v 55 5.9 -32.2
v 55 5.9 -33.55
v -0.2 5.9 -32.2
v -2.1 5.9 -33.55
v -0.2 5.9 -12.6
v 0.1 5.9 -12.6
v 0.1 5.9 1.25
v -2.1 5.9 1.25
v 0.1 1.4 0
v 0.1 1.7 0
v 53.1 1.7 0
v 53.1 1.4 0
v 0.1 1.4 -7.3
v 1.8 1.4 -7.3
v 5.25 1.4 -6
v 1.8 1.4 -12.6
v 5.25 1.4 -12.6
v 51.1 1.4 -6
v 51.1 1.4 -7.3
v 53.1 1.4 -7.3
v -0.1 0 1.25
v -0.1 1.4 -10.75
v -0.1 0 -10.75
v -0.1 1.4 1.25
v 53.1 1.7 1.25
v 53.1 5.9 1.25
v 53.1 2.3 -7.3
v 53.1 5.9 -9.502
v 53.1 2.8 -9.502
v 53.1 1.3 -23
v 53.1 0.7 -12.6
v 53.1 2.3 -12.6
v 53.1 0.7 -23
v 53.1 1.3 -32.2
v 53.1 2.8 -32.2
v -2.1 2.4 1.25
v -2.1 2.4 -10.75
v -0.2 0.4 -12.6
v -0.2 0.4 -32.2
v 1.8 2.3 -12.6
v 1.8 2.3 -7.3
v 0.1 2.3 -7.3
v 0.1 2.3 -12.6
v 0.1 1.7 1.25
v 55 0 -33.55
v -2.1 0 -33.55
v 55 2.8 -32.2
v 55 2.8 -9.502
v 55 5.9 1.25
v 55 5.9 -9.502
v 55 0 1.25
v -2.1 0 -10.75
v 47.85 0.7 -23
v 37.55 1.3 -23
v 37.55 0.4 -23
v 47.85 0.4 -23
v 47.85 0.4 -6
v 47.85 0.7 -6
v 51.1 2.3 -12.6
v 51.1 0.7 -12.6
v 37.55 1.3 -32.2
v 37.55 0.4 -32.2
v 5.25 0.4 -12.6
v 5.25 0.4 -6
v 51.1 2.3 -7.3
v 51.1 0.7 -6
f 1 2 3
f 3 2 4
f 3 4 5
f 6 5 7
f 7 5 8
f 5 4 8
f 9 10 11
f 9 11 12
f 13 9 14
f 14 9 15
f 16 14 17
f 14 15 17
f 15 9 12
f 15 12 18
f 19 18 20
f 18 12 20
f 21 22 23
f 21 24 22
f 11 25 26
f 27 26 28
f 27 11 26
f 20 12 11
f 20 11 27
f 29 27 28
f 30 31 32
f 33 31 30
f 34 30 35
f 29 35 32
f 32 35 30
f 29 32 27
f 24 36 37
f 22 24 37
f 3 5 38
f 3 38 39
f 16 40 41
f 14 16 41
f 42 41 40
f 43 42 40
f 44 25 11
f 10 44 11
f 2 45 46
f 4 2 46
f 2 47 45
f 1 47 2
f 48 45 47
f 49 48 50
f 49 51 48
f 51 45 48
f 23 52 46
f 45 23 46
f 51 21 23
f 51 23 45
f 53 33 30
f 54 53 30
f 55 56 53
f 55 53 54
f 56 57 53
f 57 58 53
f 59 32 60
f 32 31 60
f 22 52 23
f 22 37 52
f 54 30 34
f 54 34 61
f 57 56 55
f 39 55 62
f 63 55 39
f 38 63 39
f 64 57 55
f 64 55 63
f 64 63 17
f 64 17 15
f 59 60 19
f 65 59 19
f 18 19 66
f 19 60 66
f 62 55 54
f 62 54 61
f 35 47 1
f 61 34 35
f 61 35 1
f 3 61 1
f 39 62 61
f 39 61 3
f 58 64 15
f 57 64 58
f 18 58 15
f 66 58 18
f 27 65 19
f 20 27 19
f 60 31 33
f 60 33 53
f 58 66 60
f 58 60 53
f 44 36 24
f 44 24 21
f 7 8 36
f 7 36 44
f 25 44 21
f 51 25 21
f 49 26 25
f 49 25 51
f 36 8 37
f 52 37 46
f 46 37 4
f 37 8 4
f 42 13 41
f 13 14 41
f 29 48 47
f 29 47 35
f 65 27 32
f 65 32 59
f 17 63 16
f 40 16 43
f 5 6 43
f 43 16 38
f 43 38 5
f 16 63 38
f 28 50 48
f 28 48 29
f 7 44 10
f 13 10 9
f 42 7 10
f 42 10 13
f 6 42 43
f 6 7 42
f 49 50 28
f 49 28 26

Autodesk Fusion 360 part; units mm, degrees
sketch "Sketch1" plane through (0, 0, 0) normal (0, 1, 0) x (1, 0, 0)
  line L0 (0, 0) -> (53.1, 0)
  line L1 (53.1, 0) -> (53.1, 32)
  line L2 (53.1, 32) -> (0, 32)
  line L3 (0, 32) -> (0, 0)
  line L4 (26.55, 0) -> (26.55, -1.25)
  line L5 (26.55, -1.25) -> (26.55, 33.35)
  line L6 (26.55, 33.35) -> (55, 33.35)
  line L7 (55, 33.35) -> (-1.9, 33.35)
  line L8 (-1.9, 33.35) -> (-1.9, -1.25)
  line L9 (-1.9, -1.25) -> (55, -1.25)
  line L10 (55, -1.25) -> (55, 33.35)
  dimension "d1" = 53.1
  dimension "d2" = 32
  dimension "d3" = 1.25
  dimension "d4" = 34.6
  dimension "d5" = 28.45
  dimension "d6" = 56.9
  dimension "d7" = 34.6
extrude "Extrude1" add sketch "Sketch1" along normal blind 1.5
sketch "Sketch2" plane through (0, 1.5, 0) normal (0, 1, 0) x (-1, 0, 0)
  line L0 (-55, 1.25) -> (-55, -33.35)
  line L1 (-55, -33.35) -> (1.9, -33.35)
  line L2 (1.9, -33.35) -> (1.9, 1.25)
  line L3 (1.9, 1.25) -> (-55, 1.25)
  line L4 (1.9, -33.35) -> (-55, -33.35)
  line L5 (-55, -33.35) -> (-55, -32)
  line L6 (-55, -32) -> (1.9, -32)
  line L7 (1.9, -32) -> (1.9, -33.35)
  line L8 (1.9, -32) -> (0, -32)
  line L9 (0, -32) -> (0, 1.25)
  line L10 (0, 1.25) -> (1.9, 1.25)
  line L11 (1.9, 1.25) -> (1.9, -32)
  line L12 (-55, -32) -> (-53.1, -32)
  line L13 (-53.1, -32) -> (-53.1, 1.25)
  line L14 (-53.1, 1.25) -> (-55, 1.25)
  line L15 (-55, 1.25) -> (-55, -32)
  dimension "d10" = 1.35
  dimension "d11" = 1.9
  dimension "d12" = 1.9
extrude "Extrude2" add sketch "Sketch2" along normal blind 4.4 contours L0 L3 L6 L12 L13 L14 L15 | L0 L1 L2 L4 L5 L6 L7 L8 L12 | L2 L3 L6 L8 L9 L10 L11
sketch "Sketch3" plane through (0, 1.5, 0) normal (0, 1, 0) x (-1, 0, 0)
  line L0 (0, -32) -> (0, 1.25)
  line L1 (0, 1.25) -> (-53.1, 1.25)
  line L2 (-53.1, 1.25) -> (-53.1, -32)
  line L3 (-53.1, -32) -> (0, -32)
  line L4 (0, 1.25) -> (-53.1, 1.25)
  line L5 (-53.1, 1.25) -> (-53.1, 0)
  line L6 (-53.1, 0) -> (0, 0)
  line L7 (0, 0) -> (0, 1.25)
  dimension "d15" = 1.25
extrude "Extrude3" add sketch "Sketch3" along normal blind 0.5 contours L0 L1 L2 L4 L5 L6 L7
extrude "Extrude4" add 1 faces at (17.7, 1.5, -21.3333) along direction (0, 1, 0) blind 0.2
sketch "Sketch4" plane through (0, 1.7, 0) normal (0, 1, 0) x (-1, 0, 0)
  line L0 (0, 0) -> (-53.1, 0)
  line L1 (-53.1, 0) -> (-53.1, -32)
  line L2 (-53.1, -32) -> (0, -32)
  line L3 (0, -32) -> (0, 0)
  line L4 (-26.55, 0) -> (-26.55, -6)
  line L5 (-26.55, -32) -> (-26.55, -23)
  line L6 (-53.1, -16) -> (-47.85, -16)
  line L7 (0, -16) -> (-5.25, -16)
  line L8 (-26.55, -6) -> (-5.25, -6)
  line L9 (-26.55, -23) -> (-47.85, -23)
  line L10 (-47.85, -23) -> (-5.25, -23)
  line L11 (-5.25, -23) -> (-5.25, -6)
  line L12 (-5.25, -6) -> (-47.85, -6)
  line L13 (-47.85, -6) -> (-47.85, -23)
  dimension "d20" = 6
  dimension "d21" = 9
  dimension "d22" = 5.25
  dimension "d23" = 5.25
extrude "Extrude5" cut sketch "Sketch4" against normal blind 1.3 contours L8 L9 L10 L11 L12 L13
sketch "Sketch5" plane through (0, 1.7, 0) normal (0, 1, 0) x (-1, 0, 0)
  line L0 (-5.25, -23) -> (-47.85, -23)
  line L1 (-47.85, -23) -> (-47.85, -6)
  line L2 (-47.85, -6) -> (-5.25, -6)
  line L3 (-5.25, -6) -> (-5.25, -23)
  line L4 (0, 0) -> (-53.1, 0)
  line L5 (-53.1, 0) -> (-53.1, -32)
  line L6 (-53.1, -32) -> (0, -32)
  line L7 (0, -32) -> (0, 0)
  line L8 (-53.1, 0) -> (-51.1, 0)
  line L9 (-51.1, 0) -> (-51.1, -12.6)
  line L10 (-51.1, -12.6) -> (-53.1, -12.6)
  line L11 (-53.1, -12.6) -> (-53.1, 0)
  line L12 (0, 0) -> (-2, 0)
  line L13 (-2, 0) -> (-2, -12.6)
  line L14 (-2, -12.6) -> (0, -12.6)
  line L15 (0, -12.6) -> (0, 0)
  dimension "d26" = 2
  dimension "d27" = 12.6
  dimension "d28" = 2
  dimension "d29" = 12.6
extrude "Extrude6" add sketch "Sketch5" along normal blind 0.6 contours L4 L7 L12 L13 L14 L15 | L4 L5 L8 L9 L10 L11
sketch "Sketch6" plane through (0, 5.9, 0) normal (0, 1, 0) x (-1, 0, 0)
  line L0 (-53.1, -32) -> (-53.1, 1.25)
  line L1 (-53.1, 1.25) -> (-55, 1.25)
  line L2 (-55, 1.25) -> (-55, -33.35)
  line L3 (-55, -33.35) -> (1.9, -33.35)
  line L4 (1.9, -33.35) -> (1.9, 1.25)
  line L5 (1.9, 1.25) -> (0, 1.25)
  line L6 (0, 1.25) -> (0, -32)
  line L7 (0, -32) -> (-53.1, -32)
  line L8 (-53.1, -32) -> (-55, -32)
  line L9 (-55, -32) -> (-55, -12.5021)
  line L10 (-55, -12.5021) -> (-53.1, -12.5021)
  line L11 (-53.1, -12.5021) -> (-53.1, -32)
extrude "Extrude7" cut sketch "Sketch6" against normal blind 3.6 contours L0 L2 L8 L9 L10 L11
sketch "Sketch7" plane through (0, 2.3, 0) normal (0, 1, 0) x (-1, 0, 0)
  line L0 (-53.1, -12.6) -> (-51.1, -12.6)
  line L1 (-51.1, -12.6) -> (-51.1, 0)
  line L2 (-51.1, 0) -> (-53.1, 0)
  line L3 (-53.1, 0) -> (-53.1, -12.5021)
  line L4 (-53.1, -12.5021) -> (-55, -12.5021)
  line L5 (-55, -12.5021) -> (-55, -32)
  line L6 (-55, -32) -> (-53.1, -32)
  line L7 (-53.1, -32) -> (-53.1, -12.6)
  line L8 (-51.1, 0) -> (-53.1, 0)
  line L9 (-53.1, 0) -> (-53.1, -6.2511)
  line L10 (-53.1, -6.2511) -> (-51.1, -6.2511)
  line L11 (-51.1, -6.2511) -> (-51.1, 0)
extrude "Extrude8" cut sketch "Sketch7" against normal blind 0.6 contours L1 L2 L3 L8 L9 L10 L11
sketch "Sketch8" plane through (0, 2.3, 0) normal (0, 1, 0) x (-1, 0, 0)
  line L0 (0, -12.6) -> (0, 0)
  line L1 (0, 0) -> (-2, 0)
  line L2 (-2, 0) -> (-2, -12.6)
  line L3 (-2, -12.6) -> (0, -12.6)
  line L4 (-2, 0) -> (0, 0)
  line L5 (0, 0) -> (0, -6.3)
  line L6 (0, -6.3) -> (-2, -6.3)
  line L7 (-2, -6.3) -> (-2, 0)
extrude "Extrude9" cut sketch "Sketch8" against normal blind 0.6 contours L0 L1 L2 L4 L5 L6 L7
sketch "Sketch9" plane through (0, 1.7, 0) normal (0, 1, 0) x (-1, 0, 0)
  line L0 (-5.25, -23) -> (-47.85, -23)
  line L1 (-47.85, -23) -> (-47.85, -6)
  line L2 (-47.85, -6) -> (-5.25, -6)
  line L3 (-5.25, -6) -> (-5.25, -23)
  line L4 (-51.1, -6.2511) -> (-51.1, -12.6)
  line L5 (-51.1, -12.6) -> (-53.1, -12.6)
  line L6 (-53.1, -12.6) -> (-53.1, -32)
  line L7 (-53.1, -32) -> (0, -32)
  line L8 (0, -32) -> (0, -12.6)
  line L9 (0, -12.6) -> (-2, -12.6)
  line L10 (-2, -12.6) -> (-2, -6.3)
  line L11 (-2, -6.3) -> (0, -6.3)
  line L12 (0, -6.3) -> (0, 0)
  line L13 (0, 0) -> (-53.1, 0)
  line L14 (-53.1, 0) -> (-53.1, -6.2511)
  line L15 (-53.1, -6.2511) -> (-51.1, -6.2511)
  line L16 (0, -12.6) -> (-53.1, -12.6)
  line L17 (-53.1, -12.6) -> (-53.1, -32)
  line L18 (-53.1, -32) -> (0, -32)
  line L19 (0, -32) -> (0, -12.6)
extrude "Extrude10" cut sketch "Sketch9" against normal blind 1 contours L0 L1 L3 L5 L6 L7 L8 L9 L16 L17 L18 L19
sketch "Sketch10" plane through (0, 1.7, 0) normal (0, 1, 0) x (-1, 0, 0)
  line L0 (-5.25, -12.6) -> (-2, -12.6)
  line L1 (-2, -12.6) -> (-2, -6.3)
  line L2 (-2, -6.3) -> (0, -6.3)
  line L3 (0, -6.3) -> (0, 0)
  line L4 (0, 0) -> (-53.1, 0)
  line L5 (-53.1, 0) -> (-53.1, -6.2511)
  line L6 (-53.1, -6.2511) -> (-51.1, -6.2511)
  line L7 (-51.1, -6.2511) -> (-51.1, -12.6)
  line L8 (-51.1, -12.6) -> (-47.85, -12.6)
  line L9 (-47.85, -12.6) -> (-47.85, -6)
  line L10 (-47.85, -6) -> (-5.25, -6)
  line L11 (-5.25, -6) -> (-5.25, -12.6)
  line L12 (-47.85, -6) -> (-51.1, -6)
  line L13 (-51.1, -6) -> (-51.1, -12.6)
  line L14 (-51.1, -12.6) -> (-47.85, -12.6)
  line L15 (-47.85, -12.6) -> (-47.85, -6)
extrude "Extrude11" cut sketch "Sketch10" against normal blind 1 contours L7 L8 L9 L12 L13 L14 L15
sketch "Sketch11" plane through (0, 0.7, 0) normal (0, 1, 0) x (-1, 0, 0)
  line L0 (0, -32) -> (0, -12.6)
  line L1 (0, -12.6) -> (-5.25, -12.6)
  line L2 (-5.25, -12.6) -> (-5.25, -23)
  line L3 (-5.25, -23) -> (-47.85, -23)
  line L4 (-47.85, -23) -> (-47.85, -6)
  line L5 (-47.85, -6) -> (-51.1, -6)
  line L6 (-51.1, -6) -> (-51.1, -12.6)
  line L7 (-51.1, -12.6) -> (-53.1, -12.6)
  line L8 (-53.1, -12.6) -> (-53.1, -32)
  line L9 (-53.1, -32) -> (0, -32)
  line L10 (-26.55, -32) -> (-53.1, -32)
  line L11 (-53.1, -32) -> (-53.1, -23)
  line L12 (-53.1, -23) -> (-26.55, -23)
  line L13 (-26.55, -23) -> (-26.55, -32)
extrude "Extrude12" add sketch "Sketch11" along normal blind 1 contours L3 L8 L9 L10 L11 L12 L13
extrude "Extrude13" cut 1 faces at (26.55, 1.0333, -26) along direction (1, 0, 0) blind 11
extrude "Extrude14" cut 1 faces at (54.3667, 4.7, -12.5021) along direction (0, 0, 1) blind 3
extrude "Extrude15" add 1 faces at (53.1, 4.7, -4.8344) along direction (-1, 0, 0) blind 0.5
sketch "Sketch12" plane through (0, 0, 0) normal (1, 0, 0) x (0, 0, -1)
  line L0 (6.3, 2.3) -> (12.6, 2.3)
  line L1 (12.6, 2.3) -> (12.6, 0.7)
  line L2 (12.6, 0.7) -> (32, 0.7)
  line L3 (32, 0.7) -> (32, 5.9)
  line L4 (32, 5.9) -> (-1.25, 5.9)
  line L5 (-1.25, 5.9) -> (-1.25, 2)
  line L6 (-1.25, 2) -> (0, 2)
  line L7 (0, 2) -> (0, 1.7)
  line L8 (0, 1.7) -> (6.3, 1.7)
  line L9 (6.3, 1.7) -> (6.3, 2.3)
  line L10 (-1.25, 5.9) -> (12.6, 5.9)
  line L11 (12.6, 5.9) -> (12.6, -0.6915)
  line L12 (12.6, -0.6915) -> (-1.25, -0.6915)
  line L13 (-1.25, -0.6915) -> (-1.25, 5.9)
  dimension "d50" = 13.85
extrude "Extrude16" add sketch "Sketch12" along normal blind 0.5 contours L0 L4 L5 L6 L7 L8 L9 L10 L11 L13
sketch "Sketch13" plane through (0, 0, 1.25) normal (0, 0, 1) x (1, 0, 0)
  line L0 (-1.9, 0) -> (55, 0)
  line L1 (55, 0) -> (55, 5.9)
  line L2 (55, 5.9) -> (52.6, 5.9)
  line L3 (52.6, 5.9) -> (52.6, 2)
  line L4 (52.6, 2) -> (0.5, 2)
  line L5 (0.5, 2) -> (0.5, 5.9)
  line L6 (0.5, 5.9) -> (-1.9, 5.9)
  line L7 (-1.9, 5.9) -> (-1.9, 0)
  line L8 (55, 0) -> (53, 0)
  line L9 (53, 0) -> (53, 2.3)
  line L10 (53, 2.3) -> (55, 2.3)
  line L11 (55, 2.3) -> (55, 0)
  line L12 (-1.9, 0) -> (0.1, 0)
  line L13 (0.1, 0) -> (0.1, 2.3)
  line L14 (0.1, 2.3) -> (-1.9, 2.3)
  line L15 (-1.9, 2.3) -> (-1.9, 0)
  dimension "d53" = 2
  dimension "d54" = 2.3
  dimension "d55" = 2
  dimension "d56" = 2.3
extrude "Extrude17" cut sketch "Sketch13" against normal blind 12 contours L0 L7 L12 L13 L14 L15 | L0 L1 L8 L9 L10 L11
sketch "Sketch14" plane through (0, 2.3, 0) normal (0, 1, 0) x (-1, 0, 0)
  line L0 (-53, -9.5021) -> (-53, -10.75)
  line L1 (-53, -10.75) -> (-55, -10.75)
  line L2 (-55, -10.75) -> (-55, -32)
  line L3 (-55, -32) -> (-53.1, -32)
  line L4 (-53.1, -32) -> (-53.1, -12.6)
  line L5 (-53.1, -12.6) -> (-51.1, -12.6)
  line L6 (-51.1, -12.6) -> (-51.1, -6.2511)
  line L7 (-51.1, -6.2511) -> (-52.6, -6.2511)
  line L8 (-52.6, -6.2511) -> (-52.6, -9.5021)
  line L9 (-52.6, -9.5021) -> (-53, -9.5021)
  line L10 (-51.1, -9.4255) -> (-55, -9.4255)
  line L11 (-55, -9.4255) -> (-55, -32)
  line L12 (-55, -32) -> (-51.1, -32)
  line L13 (-51.1, -32) -> (-51.1, -9.4255)
extrude "Extrude18" add sketch "Sketch14" along normal blind 0.5 contours L0 L1 L2 L3 L4 L5 L6 L8 L9 L10 L11 L12 L13 | L0 L1 L8 L9 L10 L11
extrude "Extrude19" add 1 faces at (53, 0.7667, -2.75) along direction (1, 0, 0) blind 0.5
extrude "Extrude20" add 1 faces at (0.1, 0.7667, -2.75) along direction (-1, 0, 0) blind 0.5
extrude "Extrude21" cut 1 faces at (54.3667, 2.8, -18.034) along direction (0, -1, 0) blind 0.5
extrude "Extrude22" add 1 faces at (54, 2.3, -5.9181) along direction (0, -1, 0) blind 0.4
sketch "Sketch15" plane through (0, 0, -9.5021) normal (0, 0, -1) x (-1, 0, 0)
  line L0 (-52.6, 2.3) -> (-52.6, 5.9)
  line L1 (-52.6, 5.9) -> (-55, 5.9)
  line L2 (-55, 5.9) -> (-55, 1.9)
  line L3 (-55, 1.9) -> (-53.5, 1.9)
  line L4 (-53.5, 1.9) -> (-53.5, 2.3)
  line L5 (-53.5, 2.3) -> (-52.6, 2.3)
  line L6 (-53.5, 2.3) -> (-55, 2.3)
  line L7 (-55, 2.3) -> (-55, 1.9)
  line L8 (-55, 1.9) -> (-53.5, 1.9)
  line L9 (-53.5, 1.9) -> (-53.5, 2.3)
extrude "Extrude23" add sketch "Sketch15" along normal blind 1.248 contours L2 L3 L4 L6 L7 L8 L9
extrude "Extrude24" add 1 faces at (-0.9, 2.3, -2.75) along direction (0, -1, 0) blind 0.4
extrude "Extrude25" cut 1 faces at (0.5, 4.7, -5.8833) along direction (-1, 0, 0) blind 0.5
extrude "Extrude26" cut 1 faces at (52.6, 4.7, -4.8344) along direction (1, 0, 0) blind 0.5
move_face "MoveFace1" by (-0.2, 0, 0) 4 faces at (0, 2.9667, -25.5333) (-0.4, 0.6333, -2.75) (-1.9, 2.6, -25.8167) (2, 1.9, -8.4)
chamfer "Chamfer1" distance 0.5 angle 45 1 edges at (-0.6, 1.9, -4.75)
chamfer "Chamfer2" distance 0.5 angle 45 1 edges at (-2.1, 1.9, -4.75)
chamfer "Chamfer3" distance 0.5 angle 45 1 edges at (53.5, 1.9, -4.75)
sketch "Sketch16" plane through (0, 2.3, 0) normal (0, 1, 0) x (-1, 0, 0)
  line L0 (-55, -9.5021) -> (-55, -32)
  line L1 (-55, -32) -> (-53.1, -32)
  line L2 (-53.1, -32) -> (-53.1, -12.6)
  line L3 (-53.1, -12.6) -> (-51.1, -12.6)
  line L4 (-51.1, -12.6) -> (-51.1, -6.2511)
  line L5 (-51.1, -6.2511) -> (-53.1, -6.2511)
  line L6 (-53.1, -6.2511) -> (-53.1, -9.5021)
  line L7 (-53.1, -9.5021) -> (-55, -9.5021)
  line L8 (-55, -9.5021) -> (-53.1, -9.5021)
  line L9 (-53.1, -9.5021) -> (-53.1, -32)
  line L10 (-53.1, -32) -> (-55, -32)
  line L11 (-55, -32) -> (-55, -9.5021)
extrude "Extrude27" add sketch "Sketch16" along normal blind 0.5 contours L0 L1 L2 L7 L8 L9 L10 L11
chamfer "Chamfer4" distance 0.5 angle 45 1 edges at (55, 1.9, -4.75)
extrude "Extrude28" cut 2 faces at (19.3833, 1.7, -2) (47.9167, 1.7, -26) along direction (0, -1, 0) blind 0.4
extrude "Extrude29" cut 1 faces at (17.5667, 2, 0.8333) along direction (0, -1, 0) blind 0.3
extrude "Extrude30" cut 1 faces at (14.2, 0.7, -29) along direction (0, -1, 0) blind 0.3
move_face "MoveFace2" by (0, 0, -0.2) 2 faces at (12.3833, 2.5333, -32) (16.9333, 1.9667, -33.35)
sketch "Sketch17" plane through (-0.2, 0, 0) normal (1, 0, 0) x (0, 0, -1)
  line L0 (12.6, 2.3) -> (12.6, 0.4)
  line L1 (12.6, 0.4) -> (32.2, 0.4)
  line L2 (32.2, 0.4) -> (32.2, 5.9)
  line L3 (32.2, 5.9) -> (-1.25, 5.9)
  line L4 (-1.25, 5.9) -> (-1.25, 1.7)
  line L5 (-1.25, 1.7) -> (0, 1.7)
  line L6 (0, 1.7) -> (0, 1.3)
  line L7 (0, 1.3) -> (6.3, 1.3)
  line L8 (6.3, 1.3) -> (6.3, 2.3)
  line L9 (6.3, 2.3) -> (12.6, 2.3)
  line L10 (12.6, 2.3) -> (-1.25, 2.3)
  line L11 (-1.25, 2.3) -> (-1.25, 5.9)
  line L12 (-1.25, 5.9) -> (12.6, 5.9)
  line L13 (12.6, 5.9) -> (12.6, 2.3)
extrude "Extrude31" add sketch "Sketch17" along normal blind 0.8 contours L3 L4 L9 L10 L11 L12 L13 | L4 L5 L6 L7 L8 L10
sketch "Sketch18" plane through (0, 0, 1.25) normal (0, 0, 1) x (1, 0, 0)
  line L0 (53.1, 5.9) -> (53.1, 1.7)
  line L1 (53.1, 1.7) -> (0.6, 1.7)
  line L2 (0.6, 1.7) -> (0.6, 5.9)
  line L3 (0.6, 5.9) -> (-2.1, 5.9)
  line L4 (-2.1, 5.9) -> (-2.1, 2.4)
  line L5 (-2.1, 2.4) -> (-1.6, 1.9)
  line L6 (-1.6, 1.9) -> (-1.1, 1.9)
  line L7 (-1.1, 1.9) -> (-0.6, 1.4)
  line L8 (-0.6, 1.4) -> (-0.6, 0)
  line L9 (-0.6, 0) -> (53.5, 0)
  line L10 (53.5, 0) -> (53.5, 1.4)
  line L11 (53.5, 1.4) -> (54, 1.9)
  line L12 (54, 1.9) -> (54.5, 1.9)
  line L13 (54.5, 1.9) -> (55, 2.4)
  line L14 (55, 2.4) -> (55, 5.9)
  line L15 (55, 5.9) -> (53.1, 5.9)
  line L16 (-2.1, 2.4) -> (-0.1, 2.4)
  line L17 (-0.1, 2.4) -> (-0.1, 0)
  line L18 (-0.1, 0) -> (-2.1, 0)
  line L19 (-2.1, 0) -> (-2.1, 2.4)
  dimension "d91" = 2
extrude "Extrude32" cut sketch "Sketch18" against normal blind 12 contours L5 L6 L7 L8 L9 L16 L17 L18
sketch "Sketch19" plane through (0, 0, 1.25) normal (0, 0, 1) x (1, 0, 0)
  line L0 (-0.1, 2.4) -> (-0.1, 0)
  line L1 (-0.1, 0) -> (53.5, 0)
  line L2 (53.5, 0) -> (53.5, 1.4)
  line L3 (53.5, 1.4) -> (54, 1.9)
  line L4 (54, 1.9) -> (54.5, 1.9)
  line L5 (54.5, 1.9) -> (55, 2.4)
  line L6 (55, 2.4) -> (55, 5.9)
  line L7 (55, 5.9) -> (53.1, 5.9)
  line L8 (53.1, 5.9) -> (53.1, 1.7)
  line L9 (53.1, 1.7) -> (0.6, 1.7)
  line L10 (0.6, 1.7) -> (0.6, 5.9)
  line L11 (0.6, 5.9) -> (-2.1, 5.9)
  line L12 (-2.1, 5.9) -> (-2.1, 2.4)
  line L13 (-2.1, 2.4) -> (-0.1, 2.4)
  line L14 (53.5, 0) -> (55, 0)
  line L15 (55, 0) -> (55, 2.4)
  line L16 (55, 2.4) -> (53.5, 2.4)
  line L17 (53.5, 2.4) -> (53.5, 0)
extrude "Extrude33" add sketch "Sketch19" against normal blind 12 contours L2 L3 L4 L5 L14 L15 L17
chamfer "Chamfer5" distance 1 distance2 2 1 edges at (-0.1, 2.4, -4.75) measured on face at (-0.1, 1.6, -2.75)
extrude "Extrude34" cut 1 faces at (0.6, 4.7, -5.8833) along direction (-1, 0, 0) blind 0.5
extrude "Extrude35" cut 1 faces at (51.7667, 1.9667, -6.2511) along direction (0, 0, -1) blind 0.049
extrude "Extrude36" cut 1 faces at (1.2333, 1.6333, -6.3) along direction (0, 0, -1) blind 0.0001
extrude "Extrude37" cut 2 faces at (51.7667, 1.9667, -6.3001) (1.2333, 1.6333, -6.3001) along direction (0, 0, -1) blind 1
extrude "Extrude38" add 1 faces at (19.4833, 1.3, -2) along direction (0, 1, 0) blind 0.1
equation "d5 = ( 56.9 / 2 ) * 1 mm"
equation "d85 = -0.70 mm + 0.4 mm"
equation "d102 = -6.104E-05 mm"
